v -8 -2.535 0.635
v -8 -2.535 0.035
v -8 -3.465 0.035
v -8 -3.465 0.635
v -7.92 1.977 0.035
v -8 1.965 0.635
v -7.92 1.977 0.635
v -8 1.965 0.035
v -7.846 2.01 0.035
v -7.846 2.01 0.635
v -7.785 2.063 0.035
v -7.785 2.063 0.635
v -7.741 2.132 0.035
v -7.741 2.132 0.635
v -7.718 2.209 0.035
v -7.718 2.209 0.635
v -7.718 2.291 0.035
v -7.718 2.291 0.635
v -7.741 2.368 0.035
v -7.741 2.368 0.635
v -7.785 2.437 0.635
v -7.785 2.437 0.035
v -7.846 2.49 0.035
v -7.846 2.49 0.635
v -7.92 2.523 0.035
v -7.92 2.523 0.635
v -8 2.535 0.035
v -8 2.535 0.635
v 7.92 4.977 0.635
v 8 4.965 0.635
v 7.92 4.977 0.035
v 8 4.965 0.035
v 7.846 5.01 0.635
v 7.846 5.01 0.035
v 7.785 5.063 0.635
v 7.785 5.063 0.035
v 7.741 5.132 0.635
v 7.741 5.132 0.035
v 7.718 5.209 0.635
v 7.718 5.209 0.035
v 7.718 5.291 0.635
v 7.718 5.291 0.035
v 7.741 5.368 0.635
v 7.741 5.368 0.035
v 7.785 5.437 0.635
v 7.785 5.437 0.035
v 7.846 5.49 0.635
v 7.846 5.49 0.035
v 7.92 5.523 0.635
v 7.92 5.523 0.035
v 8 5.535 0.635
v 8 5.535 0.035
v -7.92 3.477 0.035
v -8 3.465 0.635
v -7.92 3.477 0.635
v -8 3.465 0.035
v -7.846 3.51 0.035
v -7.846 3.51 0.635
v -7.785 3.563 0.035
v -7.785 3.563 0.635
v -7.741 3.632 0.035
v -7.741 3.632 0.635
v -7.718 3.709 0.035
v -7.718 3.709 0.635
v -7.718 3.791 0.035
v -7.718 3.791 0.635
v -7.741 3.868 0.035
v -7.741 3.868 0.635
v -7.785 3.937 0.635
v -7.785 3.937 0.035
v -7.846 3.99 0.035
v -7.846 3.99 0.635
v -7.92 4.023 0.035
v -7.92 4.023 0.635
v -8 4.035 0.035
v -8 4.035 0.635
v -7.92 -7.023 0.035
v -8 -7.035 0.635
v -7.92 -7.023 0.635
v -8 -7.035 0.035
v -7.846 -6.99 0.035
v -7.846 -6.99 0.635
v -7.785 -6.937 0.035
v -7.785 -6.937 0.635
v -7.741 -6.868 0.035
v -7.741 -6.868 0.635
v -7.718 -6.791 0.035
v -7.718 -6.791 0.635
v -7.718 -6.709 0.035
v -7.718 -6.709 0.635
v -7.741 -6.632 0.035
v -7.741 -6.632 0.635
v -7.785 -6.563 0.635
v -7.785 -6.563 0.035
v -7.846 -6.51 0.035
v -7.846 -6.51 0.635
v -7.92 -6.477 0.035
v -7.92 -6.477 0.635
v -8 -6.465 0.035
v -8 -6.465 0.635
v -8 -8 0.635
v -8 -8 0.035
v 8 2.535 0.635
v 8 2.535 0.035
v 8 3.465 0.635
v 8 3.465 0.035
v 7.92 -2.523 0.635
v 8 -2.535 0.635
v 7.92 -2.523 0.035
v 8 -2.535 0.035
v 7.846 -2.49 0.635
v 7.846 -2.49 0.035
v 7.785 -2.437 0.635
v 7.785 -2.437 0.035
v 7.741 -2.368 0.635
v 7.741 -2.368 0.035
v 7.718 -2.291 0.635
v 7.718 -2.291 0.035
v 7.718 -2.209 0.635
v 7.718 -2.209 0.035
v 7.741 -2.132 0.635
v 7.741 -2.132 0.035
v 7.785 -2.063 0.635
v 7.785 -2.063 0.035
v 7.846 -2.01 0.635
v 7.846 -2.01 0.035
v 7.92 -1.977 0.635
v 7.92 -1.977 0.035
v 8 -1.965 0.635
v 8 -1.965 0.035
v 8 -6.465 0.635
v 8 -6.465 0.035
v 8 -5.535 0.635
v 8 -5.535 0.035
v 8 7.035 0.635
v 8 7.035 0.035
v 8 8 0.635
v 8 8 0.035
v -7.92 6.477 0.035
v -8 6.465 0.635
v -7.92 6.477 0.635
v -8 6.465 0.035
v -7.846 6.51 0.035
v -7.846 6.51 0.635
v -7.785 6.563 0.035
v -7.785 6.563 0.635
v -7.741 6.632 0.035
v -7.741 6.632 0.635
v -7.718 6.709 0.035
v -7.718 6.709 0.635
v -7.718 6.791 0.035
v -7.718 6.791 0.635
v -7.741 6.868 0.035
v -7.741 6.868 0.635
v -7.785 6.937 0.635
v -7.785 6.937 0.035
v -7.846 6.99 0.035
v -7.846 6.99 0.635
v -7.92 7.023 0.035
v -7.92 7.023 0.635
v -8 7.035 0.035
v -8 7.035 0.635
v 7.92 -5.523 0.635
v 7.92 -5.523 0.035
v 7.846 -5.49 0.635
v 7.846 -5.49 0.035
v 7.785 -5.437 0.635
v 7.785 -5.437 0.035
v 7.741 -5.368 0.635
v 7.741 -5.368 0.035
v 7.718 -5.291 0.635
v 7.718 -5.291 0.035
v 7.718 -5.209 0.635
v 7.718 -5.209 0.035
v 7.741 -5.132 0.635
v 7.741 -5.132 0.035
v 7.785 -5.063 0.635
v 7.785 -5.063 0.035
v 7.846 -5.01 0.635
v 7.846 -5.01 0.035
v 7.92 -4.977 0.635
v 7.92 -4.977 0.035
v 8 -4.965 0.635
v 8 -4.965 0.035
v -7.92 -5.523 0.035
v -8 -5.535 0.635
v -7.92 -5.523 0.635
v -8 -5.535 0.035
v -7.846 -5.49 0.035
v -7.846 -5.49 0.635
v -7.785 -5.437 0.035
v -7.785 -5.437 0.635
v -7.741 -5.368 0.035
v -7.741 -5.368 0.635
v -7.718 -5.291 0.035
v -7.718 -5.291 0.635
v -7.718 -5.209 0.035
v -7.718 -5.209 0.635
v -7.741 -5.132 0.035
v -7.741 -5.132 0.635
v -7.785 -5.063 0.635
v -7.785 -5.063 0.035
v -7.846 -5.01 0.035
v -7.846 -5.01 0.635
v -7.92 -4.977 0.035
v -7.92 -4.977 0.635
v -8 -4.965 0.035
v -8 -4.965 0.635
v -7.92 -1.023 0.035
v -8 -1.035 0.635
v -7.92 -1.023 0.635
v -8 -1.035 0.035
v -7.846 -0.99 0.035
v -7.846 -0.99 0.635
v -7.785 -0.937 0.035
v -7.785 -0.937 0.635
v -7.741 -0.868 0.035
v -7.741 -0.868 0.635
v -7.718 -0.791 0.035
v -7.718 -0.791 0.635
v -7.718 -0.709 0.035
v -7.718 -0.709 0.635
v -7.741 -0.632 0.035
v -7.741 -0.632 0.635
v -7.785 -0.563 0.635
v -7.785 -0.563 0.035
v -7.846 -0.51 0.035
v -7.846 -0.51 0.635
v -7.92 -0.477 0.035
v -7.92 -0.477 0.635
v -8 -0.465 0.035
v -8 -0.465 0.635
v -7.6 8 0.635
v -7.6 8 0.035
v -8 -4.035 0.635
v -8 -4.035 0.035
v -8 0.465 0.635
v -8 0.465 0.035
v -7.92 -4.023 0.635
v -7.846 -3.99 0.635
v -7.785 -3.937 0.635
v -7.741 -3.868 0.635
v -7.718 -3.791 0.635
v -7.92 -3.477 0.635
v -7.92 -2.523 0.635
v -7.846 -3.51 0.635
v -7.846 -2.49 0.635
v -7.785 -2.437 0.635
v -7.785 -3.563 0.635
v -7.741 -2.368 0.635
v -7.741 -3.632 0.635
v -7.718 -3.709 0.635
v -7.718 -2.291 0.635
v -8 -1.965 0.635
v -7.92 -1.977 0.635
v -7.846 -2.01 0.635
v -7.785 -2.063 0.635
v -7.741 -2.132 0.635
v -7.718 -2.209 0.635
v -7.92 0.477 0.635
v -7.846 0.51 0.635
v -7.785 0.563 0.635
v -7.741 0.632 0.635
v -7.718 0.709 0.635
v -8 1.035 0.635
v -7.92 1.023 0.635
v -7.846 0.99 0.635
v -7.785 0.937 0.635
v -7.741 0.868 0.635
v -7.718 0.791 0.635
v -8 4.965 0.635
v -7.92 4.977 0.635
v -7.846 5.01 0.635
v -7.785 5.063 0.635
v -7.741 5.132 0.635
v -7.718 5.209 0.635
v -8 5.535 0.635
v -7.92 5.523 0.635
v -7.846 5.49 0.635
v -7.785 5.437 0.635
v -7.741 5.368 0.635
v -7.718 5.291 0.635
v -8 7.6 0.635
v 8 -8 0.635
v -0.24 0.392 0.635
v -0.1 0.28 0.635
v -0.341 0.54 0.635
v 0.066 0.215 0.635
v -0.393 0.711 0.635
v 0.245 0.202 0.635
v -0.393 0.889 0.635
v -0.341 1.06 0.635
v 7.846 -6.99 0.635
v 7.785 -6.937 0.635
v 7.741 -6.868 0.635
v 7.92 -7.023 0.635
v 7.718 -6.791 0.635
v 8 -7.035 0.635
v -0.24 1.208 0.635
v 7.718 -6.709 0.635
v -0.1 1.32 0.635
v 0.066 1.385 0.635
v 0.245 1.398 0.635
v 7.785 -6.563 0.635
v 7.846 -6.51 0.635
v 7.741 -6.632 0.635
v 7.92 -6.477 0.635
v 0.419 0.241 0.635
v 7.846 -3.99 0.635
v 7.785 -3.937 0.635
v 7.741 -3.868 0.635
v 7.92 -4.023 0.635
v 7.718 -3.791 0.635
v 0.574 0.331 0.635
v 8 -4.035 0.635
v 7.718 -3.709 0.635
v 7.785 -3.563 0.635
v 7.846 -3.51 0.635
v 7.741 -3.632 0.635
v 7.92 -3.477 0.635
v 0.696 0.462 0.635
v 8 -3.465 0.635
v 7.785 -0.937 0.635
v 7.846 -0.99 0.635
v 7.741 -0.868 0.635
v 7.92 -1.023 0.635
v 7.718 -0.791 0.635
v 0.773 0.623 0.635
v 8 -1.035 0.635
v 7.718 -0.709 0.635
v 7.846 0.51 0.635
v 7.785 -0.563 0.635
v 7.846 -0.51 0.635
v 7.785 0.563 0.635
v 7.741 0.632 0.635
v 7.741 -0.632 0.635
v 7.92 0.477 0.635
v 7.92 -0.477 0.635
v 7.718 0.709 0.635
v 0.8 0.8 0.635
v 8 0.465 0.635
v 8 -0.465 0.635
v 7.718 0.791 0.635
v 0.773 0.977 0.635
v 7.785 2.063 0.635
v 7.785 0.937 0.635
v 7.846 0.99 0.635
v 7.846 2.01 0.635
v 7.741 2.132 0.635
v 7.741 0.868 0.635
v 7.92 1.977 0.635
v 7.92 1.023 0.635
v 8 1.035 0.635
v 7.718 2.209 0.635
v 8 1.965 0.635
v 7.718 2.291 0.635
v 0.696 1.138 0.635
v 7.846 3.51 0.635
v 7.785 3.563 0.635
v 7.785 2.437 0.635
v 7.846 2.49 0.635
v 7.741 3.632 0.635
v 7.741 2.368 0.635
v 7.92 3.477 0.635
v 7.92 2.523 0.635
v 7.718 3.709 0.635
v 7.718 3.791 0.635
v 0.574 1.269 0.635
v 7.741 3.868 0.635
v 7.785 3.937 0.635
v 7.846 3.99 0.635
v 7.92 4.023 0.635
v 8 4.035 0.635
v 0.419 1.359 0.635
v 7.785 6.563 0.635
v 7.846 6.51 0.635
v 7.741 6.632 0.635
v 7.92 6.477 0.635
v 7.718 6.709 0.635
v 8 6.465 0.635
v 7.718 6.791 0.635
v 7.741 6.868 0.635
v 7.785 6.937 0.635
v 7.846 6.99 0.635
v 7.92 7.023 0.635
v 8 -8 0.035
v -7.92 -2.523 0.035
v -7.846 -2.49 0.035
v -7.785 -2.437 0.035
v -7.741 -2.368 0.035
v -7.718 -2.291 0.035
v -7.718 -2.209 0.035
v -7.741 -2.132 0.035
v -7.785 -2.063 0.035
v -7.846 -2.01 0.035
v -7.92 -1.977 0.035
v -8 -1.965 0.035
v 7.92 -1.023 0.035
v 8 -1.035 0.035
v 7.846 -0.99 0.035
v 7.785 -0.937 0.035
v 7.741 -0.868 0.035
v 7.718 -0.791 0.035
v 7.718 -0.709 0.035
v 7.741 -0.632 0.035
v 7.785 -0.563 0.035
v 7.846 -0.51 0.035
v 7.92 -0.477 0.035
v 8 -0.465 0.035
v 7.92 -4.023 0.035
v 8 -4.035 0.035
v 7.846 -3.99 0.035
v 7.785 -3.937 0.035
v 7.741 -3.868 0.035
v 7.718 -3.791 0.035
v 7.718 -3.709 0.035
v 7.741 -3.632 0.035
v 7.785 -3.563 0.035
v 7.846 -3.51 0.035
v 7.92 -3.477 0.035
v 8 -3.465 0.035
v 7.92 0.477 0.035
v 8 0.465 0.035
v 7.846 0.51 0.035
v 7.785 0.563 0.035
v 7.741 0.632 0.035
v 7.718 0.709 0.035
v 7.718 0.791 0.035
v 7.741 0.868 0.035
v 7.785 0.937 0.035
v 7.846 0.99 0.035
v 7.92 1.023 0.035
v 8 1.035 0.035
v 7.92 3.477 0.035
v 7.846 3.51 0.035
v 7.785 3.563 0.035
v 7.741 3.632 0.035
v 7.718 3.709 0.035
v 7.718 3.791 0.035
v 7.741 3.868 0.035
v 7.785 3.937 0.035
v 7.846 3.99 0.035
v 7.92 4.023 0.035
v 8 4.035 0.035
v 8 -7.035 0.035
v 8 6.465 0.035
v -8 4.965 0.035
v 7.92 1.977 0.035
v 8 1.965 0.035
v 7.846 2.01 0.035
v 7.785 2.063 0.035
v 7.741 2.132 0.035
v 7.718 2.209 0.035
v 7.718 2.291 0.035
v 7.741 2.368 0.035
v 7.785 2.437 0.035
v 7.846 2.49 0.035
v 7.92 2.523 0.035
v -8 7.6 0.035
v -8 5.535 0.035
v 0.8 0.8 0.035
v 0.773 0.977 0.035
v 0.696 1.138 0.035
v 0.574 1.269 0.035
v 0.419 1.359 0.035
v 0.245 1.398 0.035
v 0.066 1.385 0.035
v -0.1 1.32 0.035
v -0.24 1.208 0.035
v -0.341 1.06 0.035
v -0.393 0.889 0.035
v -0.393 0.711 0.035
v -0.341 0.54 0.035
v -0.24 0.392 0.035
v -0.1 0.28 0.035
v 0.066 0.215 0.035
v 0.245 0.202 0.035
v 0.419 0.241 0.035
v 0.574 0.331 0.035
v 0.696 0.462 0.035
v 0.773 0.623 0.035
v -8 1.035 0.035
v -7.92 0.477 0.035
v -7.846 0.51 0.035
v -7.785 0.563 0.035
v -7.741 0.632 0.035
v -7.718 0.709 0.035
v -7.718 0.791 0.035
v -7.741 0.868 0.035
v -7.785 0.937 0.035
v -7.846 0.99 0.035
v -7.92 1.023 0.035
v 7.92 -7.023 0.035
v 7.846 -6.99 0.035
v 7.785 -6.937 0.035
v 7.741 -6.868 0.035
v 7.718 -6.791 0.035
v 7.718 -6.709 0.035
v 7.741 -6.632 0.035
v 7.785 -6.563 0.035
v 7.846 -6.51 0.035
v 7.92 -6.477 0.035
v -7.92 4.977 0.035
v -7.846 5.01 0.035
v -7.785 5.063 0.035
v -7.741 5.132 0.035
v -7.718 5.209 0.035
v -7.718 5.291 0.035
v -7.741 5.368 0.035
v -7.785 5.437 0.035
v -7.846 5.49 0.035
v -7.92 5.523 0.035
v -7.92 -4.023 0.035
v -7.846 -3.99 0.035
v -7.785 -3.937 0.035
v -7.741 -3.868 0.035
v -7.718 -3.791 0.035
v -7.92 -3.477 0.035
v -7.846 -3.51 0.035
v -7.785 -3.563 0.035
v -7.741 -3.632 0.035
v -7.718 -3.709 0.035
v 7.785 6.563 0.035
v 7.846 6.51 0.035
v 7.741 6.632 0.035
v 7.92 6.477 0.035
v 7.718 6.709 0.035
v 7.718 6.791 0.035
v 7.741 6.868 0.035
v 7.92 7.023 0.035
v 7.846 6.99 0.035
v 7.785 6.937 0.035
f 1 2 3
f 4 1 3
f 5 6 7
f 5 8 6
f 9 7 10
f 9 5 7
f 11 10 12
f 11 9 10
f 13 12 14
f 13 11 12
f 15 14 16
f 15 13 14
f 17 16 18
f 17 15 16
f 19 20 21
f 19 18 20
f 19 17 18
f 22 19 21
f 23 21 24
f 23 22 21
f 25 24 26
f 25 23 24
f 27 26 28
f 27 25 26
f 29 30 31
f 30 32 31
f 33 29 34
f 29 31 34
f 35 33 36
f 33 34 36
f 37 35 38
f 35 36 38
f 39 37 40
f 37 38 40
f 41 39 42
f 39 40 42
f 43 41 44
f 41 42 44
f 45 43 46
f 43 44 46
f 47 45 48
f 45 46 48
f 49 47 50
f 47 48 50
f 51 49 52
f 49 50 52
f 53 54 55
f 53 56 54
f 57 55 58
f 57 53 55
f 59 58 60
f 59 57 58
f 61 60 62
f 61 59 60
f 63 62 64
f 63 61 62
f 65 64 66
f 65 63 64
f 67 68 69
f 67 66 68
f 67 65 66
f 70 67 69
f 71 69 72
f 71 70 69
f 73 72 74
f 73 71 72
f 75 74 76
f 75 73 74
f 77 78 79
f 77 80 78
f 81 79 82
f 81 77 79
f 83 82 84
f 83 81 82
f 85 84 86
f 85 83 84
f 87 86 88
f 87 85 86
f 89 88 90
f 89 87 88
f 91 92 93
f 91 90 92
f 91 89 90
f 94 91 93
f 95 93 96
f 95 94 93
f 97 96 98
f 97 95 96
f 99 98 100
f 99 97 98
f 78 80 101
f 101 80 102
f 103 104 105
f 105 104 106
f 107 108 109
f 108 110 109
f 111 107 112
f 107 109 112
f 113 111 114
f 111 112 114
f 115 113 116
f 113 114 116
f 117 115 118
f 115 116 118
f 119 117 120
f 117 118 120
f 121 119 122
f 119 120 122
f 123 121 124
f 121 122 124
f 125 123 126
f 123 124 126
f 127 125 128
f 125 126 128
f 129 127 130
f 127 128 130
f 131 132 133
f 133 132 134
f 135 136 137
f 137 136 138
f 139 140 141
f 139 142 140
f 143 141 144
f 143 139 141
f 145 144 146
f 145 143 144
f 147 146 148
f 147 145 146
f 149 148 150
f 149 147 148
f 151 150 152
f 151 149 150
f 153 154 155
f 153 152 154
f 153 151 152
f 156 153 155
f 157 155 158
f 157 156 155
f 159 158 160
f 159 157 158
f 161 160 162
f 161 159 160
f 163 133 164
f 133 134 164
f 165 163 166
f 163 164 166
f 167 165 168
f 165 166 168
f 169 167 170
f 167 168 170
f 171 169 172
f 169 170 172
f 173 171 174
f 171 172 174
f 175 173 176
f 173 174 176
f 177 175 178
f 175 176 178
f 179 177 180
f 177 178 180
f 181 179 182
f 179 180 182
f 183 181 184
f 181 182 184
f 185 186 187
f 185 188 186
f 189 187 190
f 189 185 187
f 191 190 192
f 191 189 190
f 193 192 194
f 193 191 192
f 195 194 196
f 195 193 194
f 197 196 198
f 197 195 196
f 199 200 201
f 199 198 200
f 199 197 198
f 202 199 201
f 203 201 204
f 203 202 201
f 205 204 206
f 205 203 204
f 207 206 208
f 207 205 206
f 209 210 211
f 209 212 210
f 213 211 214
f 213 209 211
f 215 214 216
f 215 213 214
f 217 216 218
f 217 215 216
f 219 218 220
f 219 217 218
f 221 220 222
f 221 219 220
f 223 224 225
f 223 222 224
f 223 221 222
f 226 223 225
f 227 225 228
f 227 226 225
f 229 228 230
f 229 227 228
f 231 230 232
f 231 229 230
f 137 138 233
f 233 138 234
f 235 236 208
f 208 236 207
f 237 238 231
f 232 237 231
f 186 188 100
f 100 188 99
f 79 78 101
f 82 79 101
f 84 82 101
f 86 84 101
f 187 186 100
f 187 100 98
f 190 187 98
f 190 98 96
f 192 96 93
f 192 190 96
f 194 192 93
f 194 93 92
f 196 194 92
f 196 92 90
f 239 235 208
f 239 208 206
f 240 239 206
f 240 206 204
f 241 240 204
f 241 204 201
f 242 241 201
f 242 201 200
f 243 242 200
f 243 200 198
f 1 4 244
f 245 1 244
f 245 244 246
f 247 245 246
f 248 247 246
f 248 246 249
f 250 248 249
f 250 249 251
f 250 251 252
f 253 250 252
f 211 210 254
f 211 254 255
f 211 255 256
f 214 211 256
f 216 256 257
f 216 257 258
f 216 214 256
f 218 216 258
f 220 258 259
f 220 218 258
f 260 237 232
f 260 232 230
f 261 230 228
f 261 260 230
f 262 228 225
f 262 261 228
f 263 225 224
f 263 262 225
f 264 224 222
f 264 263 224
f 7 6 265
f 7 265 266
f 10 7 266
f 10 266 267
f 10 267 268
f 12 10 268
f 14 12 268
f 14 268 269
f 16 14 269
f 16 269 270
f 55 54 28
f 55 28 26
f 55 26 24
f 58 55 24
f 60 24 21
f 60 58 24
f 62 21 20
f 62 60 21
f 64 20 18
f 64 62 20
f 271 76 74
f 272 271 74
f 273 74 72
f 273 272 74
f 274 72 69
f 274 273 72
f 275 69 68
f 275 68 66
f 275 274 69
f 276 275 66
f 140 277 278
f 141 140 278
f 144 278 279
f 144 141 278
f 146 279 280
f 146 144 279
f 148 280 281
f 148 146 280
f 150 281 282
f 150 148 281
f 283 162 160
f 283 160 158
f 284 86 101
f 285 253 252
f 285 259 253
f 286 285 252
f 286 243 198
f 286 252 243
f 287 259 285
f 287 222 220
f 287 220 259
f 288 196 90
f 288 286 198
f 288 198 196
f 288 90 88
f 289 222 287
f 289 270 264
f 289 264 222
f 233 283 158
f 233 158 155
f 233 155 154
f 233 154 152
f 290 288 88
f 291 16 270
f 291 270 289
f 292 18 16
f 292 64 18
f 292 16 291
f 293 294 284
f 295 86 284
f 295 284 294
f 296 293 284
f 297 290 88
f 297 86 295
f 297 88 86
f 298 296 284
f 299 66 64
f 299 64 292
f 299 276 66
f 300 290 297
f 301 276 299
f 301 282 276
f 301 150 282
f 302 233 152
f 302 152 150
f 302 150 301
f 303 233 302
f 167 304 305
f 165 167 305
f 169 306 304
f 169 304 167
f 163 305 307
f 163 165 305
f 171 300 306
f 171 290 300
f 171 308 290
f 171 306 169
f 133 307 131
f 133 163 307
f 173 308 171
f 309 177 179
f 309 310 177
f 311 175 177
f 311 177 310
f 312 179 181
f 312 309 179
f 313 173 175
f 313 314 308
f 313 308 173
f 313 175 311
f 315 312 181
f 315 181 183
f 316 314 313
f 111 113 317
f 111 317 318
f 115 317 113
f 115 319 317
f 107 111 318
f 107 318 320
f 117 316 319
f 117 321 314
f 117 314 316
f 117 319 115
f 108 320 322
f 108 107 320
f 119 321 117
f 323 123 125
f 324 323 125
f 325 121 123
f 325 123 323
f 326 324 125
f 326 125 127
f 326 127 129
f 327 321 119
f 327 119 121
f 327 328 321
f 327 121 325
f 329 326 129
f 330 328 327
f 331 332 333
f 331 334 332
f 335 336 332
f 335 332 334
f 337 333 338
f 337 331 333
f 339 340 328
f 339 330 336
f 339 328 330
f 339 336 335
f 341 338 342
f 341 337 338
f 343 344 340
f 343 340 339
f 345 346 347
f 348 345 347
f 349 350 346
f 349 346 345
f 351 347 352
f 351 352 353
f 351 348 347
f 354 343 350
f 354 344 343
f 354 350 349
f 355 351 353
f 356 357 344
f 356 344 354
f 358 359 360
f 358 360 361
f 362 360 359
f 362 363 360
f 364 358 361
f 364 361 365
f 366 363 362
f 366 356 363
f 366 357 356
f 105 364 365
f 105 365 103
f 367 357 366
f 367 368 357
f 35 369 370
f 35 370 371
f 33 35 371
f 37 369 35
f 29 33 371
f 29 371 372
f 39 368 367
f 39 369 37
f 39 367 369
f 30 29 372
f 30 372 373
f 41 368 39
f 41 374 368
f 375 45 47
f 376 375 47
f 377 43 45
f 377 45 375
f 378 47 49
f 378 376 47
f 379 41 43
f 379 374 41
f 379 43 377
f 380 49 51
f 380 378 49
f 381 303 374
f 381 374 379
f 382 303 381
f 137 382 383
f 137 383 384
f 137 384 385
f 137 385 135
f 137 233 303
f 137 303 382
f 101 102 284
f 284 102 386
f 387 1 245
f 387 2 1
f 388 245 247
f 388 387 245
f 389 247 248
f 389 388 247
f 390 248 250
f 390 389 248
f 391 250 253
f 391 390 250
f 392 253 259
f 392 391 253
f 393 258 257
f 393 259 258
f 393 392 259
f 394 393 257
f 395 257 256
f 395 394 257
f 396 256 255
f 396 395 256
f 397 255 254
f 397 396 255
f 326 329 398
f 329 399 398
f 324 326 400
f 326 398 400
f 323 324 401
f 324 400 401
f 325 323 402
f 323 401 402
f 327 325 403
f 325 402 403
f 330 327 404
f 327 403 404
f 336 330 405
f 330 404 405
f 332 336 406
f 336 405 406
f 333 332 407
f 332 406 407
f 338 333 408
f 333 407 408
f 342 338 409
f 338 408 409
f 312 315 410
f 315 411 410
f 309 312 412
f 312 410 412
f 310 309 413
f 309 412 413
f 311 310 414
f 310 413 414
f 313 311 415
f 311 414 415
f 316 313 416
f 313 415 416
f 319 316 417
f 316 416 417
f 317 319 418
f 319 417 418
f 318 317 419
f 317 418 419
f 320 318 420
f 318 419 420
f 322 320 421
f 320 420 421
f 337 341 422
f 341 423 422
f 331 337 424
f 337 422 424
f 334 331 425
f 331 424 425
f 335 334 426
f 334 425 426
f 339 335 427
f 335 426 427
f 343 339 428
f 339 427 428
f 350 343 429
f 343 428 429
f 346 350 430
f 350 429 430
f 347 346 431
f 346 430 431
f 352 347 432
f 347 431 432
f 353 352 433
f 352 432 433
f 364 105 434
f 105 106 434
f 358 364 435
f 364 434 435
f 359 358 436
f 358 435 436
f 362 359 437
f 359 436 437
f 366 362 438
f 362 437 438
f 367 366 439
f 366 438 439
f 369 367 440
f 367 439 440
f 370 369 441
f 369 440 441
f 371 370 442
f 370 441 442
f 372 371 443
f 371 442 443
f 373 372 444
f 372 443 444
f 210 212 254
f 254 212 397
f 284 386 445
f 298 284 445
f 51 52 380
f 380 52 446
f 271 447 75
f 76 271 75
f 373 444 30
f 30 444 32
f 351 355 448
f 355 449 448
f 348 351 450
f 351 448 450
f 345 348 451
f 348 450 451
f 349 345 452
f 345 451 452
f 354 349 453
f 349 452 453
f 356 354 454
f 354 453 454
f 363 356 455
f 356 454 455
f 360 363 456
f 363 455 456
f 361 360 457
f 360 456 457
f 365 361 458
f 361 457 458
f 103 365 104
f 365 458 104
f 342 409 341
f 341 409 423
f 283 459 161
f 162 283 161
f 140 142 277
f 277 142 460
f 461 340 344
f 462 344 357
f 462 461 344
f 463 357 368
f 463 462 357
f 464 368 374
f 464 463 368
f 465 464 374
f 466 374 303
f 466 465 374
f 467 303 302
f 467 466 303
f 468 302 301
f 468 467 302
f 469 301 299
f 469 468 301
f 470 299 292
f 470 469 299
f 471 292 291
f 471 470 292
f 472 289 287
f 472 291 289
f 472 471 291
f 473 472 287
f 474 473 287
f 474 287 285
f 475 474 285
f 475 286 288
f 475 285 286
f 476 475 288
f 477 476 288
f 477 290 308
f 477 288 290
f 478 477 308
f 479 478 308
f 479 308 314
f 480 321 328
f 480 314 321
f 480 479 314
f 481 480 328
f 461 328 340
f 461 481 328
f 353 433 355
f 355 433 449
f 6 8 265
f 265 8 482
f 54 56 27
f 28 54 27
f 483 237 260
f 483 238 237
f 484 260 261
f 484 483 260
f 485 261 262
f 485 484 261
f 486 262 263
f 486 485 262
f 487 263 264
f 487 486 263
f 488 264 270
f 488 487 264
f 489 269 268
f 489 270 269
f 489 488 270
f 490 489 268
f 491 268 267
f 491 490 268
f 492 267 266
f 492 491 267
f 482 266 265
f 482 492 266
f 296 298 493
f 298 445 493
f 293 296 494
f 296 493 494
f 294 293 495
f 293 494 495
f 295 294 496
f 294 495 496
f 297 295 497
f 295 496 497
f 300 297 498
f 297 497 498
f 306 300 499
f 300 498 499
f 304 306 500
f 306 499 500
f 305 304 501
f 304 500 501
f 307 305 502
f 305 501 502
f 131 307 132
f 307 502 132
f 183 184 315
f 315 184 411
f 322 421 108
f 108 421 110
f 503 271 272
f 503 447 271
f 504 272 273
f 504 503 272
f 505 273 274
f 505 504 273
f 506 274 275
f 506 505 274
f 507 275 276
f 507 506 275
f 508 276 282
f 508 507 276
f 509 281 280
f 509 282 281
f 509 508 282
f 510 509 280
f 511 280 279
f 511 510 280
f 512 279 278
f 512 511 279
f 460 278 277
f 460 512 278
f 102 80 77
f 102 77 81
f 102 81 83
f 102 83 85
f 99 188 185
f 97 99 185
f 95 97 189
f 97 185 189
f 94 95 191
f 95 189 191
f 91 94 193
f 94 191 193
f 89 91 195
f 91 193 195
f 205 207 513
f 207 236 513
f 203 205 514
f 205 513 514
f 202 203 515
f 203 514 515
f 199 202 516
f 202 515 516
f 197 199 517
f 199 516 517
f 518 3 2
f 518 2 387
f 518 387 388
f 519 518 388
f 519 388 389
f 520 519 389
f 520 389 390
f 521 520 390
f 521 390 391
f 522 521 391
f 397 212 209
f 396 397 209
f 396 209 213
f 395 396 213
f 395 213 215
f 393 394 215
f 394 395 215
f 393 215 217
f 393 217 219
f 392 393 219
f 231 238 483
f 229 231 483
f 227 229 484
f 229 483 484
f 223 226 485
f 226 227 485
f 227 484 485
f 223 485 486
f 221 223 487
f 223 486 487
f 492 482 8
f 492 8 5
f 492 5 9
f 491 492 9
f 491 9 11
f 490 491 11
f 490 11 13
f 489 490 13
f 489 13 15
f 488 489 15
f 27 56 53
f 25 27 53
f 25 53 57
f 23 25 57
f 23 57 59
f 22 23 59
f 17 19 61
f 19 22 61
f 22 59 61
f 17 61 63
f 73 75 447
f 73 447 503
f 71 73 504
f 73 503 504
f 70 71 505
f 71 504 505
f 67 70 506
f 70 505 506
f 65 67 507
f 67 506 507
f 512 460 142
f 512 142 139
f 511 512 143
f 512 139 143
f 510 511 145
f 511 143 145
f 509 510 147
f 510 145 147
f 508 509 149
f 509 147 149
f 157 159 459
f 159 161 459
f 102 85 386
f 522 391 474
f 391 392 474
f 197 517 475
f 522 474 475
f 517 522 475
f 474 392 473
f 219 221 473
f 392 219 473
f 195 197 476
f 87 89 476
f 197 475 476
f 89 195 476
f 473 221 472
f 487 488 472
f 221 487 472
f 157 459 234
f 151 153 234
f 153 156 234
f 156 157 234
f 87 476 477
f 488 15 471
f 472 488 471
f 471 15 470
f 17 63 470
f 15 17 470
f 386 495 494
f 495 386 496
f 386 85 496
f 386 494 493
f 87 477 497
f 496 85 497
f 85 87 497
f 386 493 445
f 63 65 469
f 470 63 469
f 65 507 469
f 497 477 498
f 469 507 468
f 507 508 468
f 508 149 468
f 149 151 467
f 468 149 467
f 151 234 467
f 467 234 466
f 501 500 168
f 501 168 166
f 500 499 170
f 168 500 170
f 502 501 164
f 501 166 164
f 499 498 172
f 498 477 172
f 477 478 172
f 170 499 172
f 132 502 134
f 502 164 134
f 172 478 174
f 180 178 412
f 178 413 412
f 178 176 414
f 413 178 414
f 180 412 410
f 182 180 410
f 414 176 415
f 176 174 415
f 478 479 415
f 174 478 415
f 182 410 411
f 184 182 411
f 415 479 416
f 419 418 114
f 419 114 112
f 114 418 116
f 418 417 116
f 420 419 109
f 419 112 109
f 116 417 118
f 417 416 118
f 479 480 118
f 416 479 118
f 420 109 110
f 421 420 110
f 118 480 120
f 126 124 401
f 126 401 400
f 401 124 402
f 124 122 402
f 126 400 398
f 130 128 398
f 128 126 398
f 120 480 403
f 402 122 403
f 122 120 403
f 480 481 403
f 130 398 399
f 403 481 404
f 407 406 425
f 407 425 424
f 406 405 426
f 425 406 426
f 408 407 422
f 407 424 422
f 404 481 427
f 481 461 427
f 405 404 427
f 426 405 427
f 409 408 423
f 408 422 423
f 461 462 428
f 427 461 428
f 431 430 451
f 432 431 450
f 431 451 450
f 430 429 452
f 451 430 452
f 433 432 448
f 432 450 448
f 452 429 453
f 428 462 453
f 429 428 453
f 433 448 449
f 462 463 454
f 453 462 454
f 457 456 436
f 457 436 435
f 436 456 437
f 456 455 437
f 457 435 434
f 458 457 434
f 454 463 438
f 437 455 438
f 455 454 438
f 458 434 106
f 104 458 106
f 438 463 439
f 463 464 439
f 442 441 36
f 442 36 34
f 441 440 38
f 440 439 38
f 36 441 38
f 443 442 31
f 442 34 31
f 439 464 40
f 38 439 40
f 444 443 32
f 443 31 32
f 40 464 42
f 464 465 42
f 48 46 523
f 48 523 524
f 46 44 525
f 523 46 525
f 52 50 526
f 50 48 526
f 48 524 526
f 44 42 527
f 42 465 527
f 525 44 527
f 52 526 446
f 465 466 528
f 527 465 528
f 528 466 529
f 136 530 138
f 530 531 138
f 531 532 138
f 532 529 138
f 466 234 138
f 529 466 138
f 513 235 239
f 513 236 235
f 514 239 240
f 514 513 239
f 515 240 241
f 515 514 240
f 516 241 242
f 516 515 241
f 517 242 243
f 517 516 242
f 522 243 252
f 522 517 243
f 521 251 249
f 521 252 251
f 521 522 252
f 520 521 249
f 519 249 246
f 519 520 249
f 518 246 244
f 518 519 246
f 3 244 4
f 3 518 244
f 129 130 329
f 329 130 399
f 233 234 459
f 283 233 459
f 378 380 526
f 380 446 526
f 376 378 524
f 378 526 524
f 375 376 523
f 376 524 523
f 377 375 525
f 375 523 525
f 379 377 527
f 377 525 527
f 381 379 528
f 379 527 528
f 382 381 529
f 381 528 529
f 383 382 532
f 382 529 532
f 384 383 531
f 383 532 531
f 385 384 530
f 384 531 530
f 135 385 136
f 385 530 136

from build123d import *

# Parameters (mm, degrees)
PAD_DEPTH                        = 0.6
SKETCH001_R                      = 0.6
POCKET_DEPTH                     = 0.601
SKETCH002_R                      = 0.2848
POCKET001_DEPTH                  = 45.871741
SKETCH002_LINEARPATTERN_2_R      = 0.2848
POCKET001_LINEARPATTERN_2_DEPTH  = 45.871741
SKETCH002_LINEARPATTERN_3_R      = 0.2848
POCKET001_LINEARPATTERN_3_DEPTH  = 45.871741
SKETCH002_LINEARPATTERN_4_R      = 0.2848
POCKET001_LINEARPATTERN_4_DEPTH  = 45.871741
SKETCH002_LINEARPATTERN_5_R      = 0.2848
POCKET001_LINEARPATTERN_5_DEPTH  = 45.871741
SKETCH002_LINEARPATTERN_6_R      = 0.2848
POCKET001_LINEARPATTERN_6_DEPTH  = 45.871741
SKETCH002_LINEARPATTERN_7_R      = 0.2848
POCKET001_LINEARPATTERN_7_DEPTH  = 45.871741
SKETCH002_LINEARPATTERN_8_R      = 0.2848
POCKET001_LINEARPATTERN_8_DEPTH  = 45.871741
SKETCH002_LINEARPATTERN_9_R      = 0.2848
POCKET001_LINEARPATTERN_9_DEPTH  = 45.871741
SKETCH002_LINEARPATTERN_10_R     = 0.2848
POCKET001_LINEARPATTERN_10_DEPTH = 45.871741


with BuildPart() as part:
    # Sketch → Pad (new body)
    with BuildSketch(Plane.XY):
        Polygon((-8, -8), (8, -8), (8, 8), (-7.6, 8), (-8, 7.6), align=None)
    extrude(amount=PAD_DEPTH)

    # Sketch001 → Pocket (cut, through all)
    with BuildSketch(Plane.XY):
        with Locations((0.2, 0.8)):
            Circle(SKETCH001_R)
    extrude(amount=POCKET_DEPTH, mode=Mode.SUBTRACT)

    # Sketch002 → Pocket001 (cut, through all)
    with BuildSketch(Plane.XY):
        with Locations((-8, 6.75)):
            Circle(SKETCH002_R)
    pocket001 = extrude(amount=POCKET001_DEPTH, mode=Mode.SUBTRACT)

    # Sketch002 LinearPattern 2 → Pocket001 LinearPattern 2 (cut, through all)
    with BuildSketch(Plane(origin=(0, -1.5, 0), x_dir=(1, 0, 0), z_dir=(0, 0, 1))):
        with Locations((-8, 6.75)):
            Circle(SKETCH002_LINEARPATTERN_2_R)
    pocket001_linearpattern_2 = extrude(amount=POCKET001_LINEARPATTERN_2_DEPTH, mode=Mode.SUBTRACT)

    # Sketch002 LinearPattern 3 → Pocket001 LinearPattern 3 (cut, through all)
    with BuildSketch(Plane(origin=(0, -3, 0), x_dir=(1, 0, 0), z_dir=(0, 0, 1))):
        with Locations((-8, 6.75)):
            Circle(SKETCH002_LINEARPATTERN_3_R)
    pocket001_linearpattern_3 = extrude(amount=POCKET001_LINEARPATTERN_3_DEPTH, mode=Mode.SUBTRACT)

    # Sketch002 LinearPattern 4 → Pocket001 LinearPattern 4 (cut, through all)
    with BuildSketch(Plane(origin=(0, -4.5, 0), x_dir=(1, 0, 0), z_dir=(0, 0, 1))):
        with Locations((-8, 6.75)):
            Circle(SKETCH002_LINEARPATTERN_4_R)
    pocket001_linearpattern_4 = extrude(amount=POCKET001_LINEARPATTERN_4_DEPTH, mode=Mode.SUBTRACT)

    # Sketch002 LinearPattern 5 → Pocket001 LinearPattern 5 (cut, through all)
    with BuildSketch(Plane(origin=(0, -6, 0), x_dir=(1, 0, 0), z_dir=(0, 0, 1))):
        with Locations((-8, 6.75)):
            Circle(SKETCH002_LINEARPATTERN_5_R)
    pocket001_linearpattern_5 = extrude(amount=POCKET001_LINEARPATTERN_5_DEPTH, mode=Mode.SUBTRACT)

    # Sketch002 LinearPattern 6 → Pocket001 LinearPattern 6 (cut, through all)
    with BuildSketch(Plane(origin=(0, -7.5, 0), x_dir=(1, 0, 0), z_dir=(0, 0, 1))):
        with Locations((-8, 6.75)):
            Circle(SKETCH002_LINEARPATTERN_6_R)
    pocket001_linearpattern_6 = extrude(amount=POCKET001_LINEARPATTERN_6_DEPTH, mode=Mode.SUBTRACT)

    # Sketch002 LinearPattern 7 → Pocket001 LinearPattern 7 (cut, through all)
    with BuildSketch(Plane(origin=(0, -9, 0), x_dir=(1, 0, 0), z_dir=(0, 0, 1))):
        with Locations((-8, 6.75)):
            Circle(SKETCH002_LINEARPATTERN_7_R)
    pocket001_linearpattern_7 = extrude(amount=POCKET001_LINEARPATTERN_7_DEPTH, mode=Mode.SUBTRACT)

    # Sketch002 LinearPattern 8 → Pocket001 LinearPattern 8 (cut, through all)
    with BuildSketch(Plane(origin=(0, -10.5, 0), x_dir=(1, 0, 0), z_dir=(0, 0, 1))):
        with Locations((-8, 6.75)):
            Circle(SKETCH002_LINEARPATTERN_8_R)
    pocket001_linearpattern_8 = extrude(amount=POCKET001_LINEARPATTERN_8_DEPTH, mode=Mode.SUBTRACT)

    # Sketch002 LinearPattern 9 → Pocket001 LinearPattern 9 (cut, through all)
    with BuildSketch(Plane(origin=(0, -12, 0), x_dir=(1, 0, 0), z_dir=(0, 0, 1))):
        with Locations((-8, 6.75)):
            Circle(SKETCH002_LINEARPATTERN_9_R)
    pocket001_linearpattern_9 = extrude(amount=POCKET001_LINEARPATTERN_9_DEPTH, mode=Mode.SUBTRACT)

    # Sketch002 LinearPattern 10 → Pocket001 LinearPattern 10 (cut, through all)
    with BuildSketch(Plane(origin=(0, -13.5, 0), x_dir=(1, 0, 0), z_dir=(0, 0, 1))):
        with Locations((-8, 6.75)):
            Circle(SKETCH002_LINEARPATTERN_10_R)
    pocket001_linearpattern_10 = extrude(amount=POCKET001_LINEARPATTERN_10_DEPTH, mode=Mode.SUBTRACT)

    # Mirrored: Pocket001, Pocket001 LinearPattern 2, Pocket001 LinearPattern 3, Pocket001 LinearPattern 4, Pocket001 LinearPattern 5, Pocket001 LinearPattern 6, Pocket001 LinearPattern 7, Pocket001 LinearPattern 8, Pocket001 LinearPattern 9, Pocket001 LinearPattern 10 across Sketch002 V_Axis
    add(pocket001.mirror(Plane(origin=(0, 0, 0), x_dir=(0, 0, 1), z_dir=(1, 0, 0))), mode=Mode.SUBTRACT)
    add(pocket001_linearpattern_2.mirror(Plane(origin=(0, 0, 0), x_dir=(0, 0, 1), z_dir=(1, 0, 0))), mode=Mode.SUBTRACT)
    add(pocket001_linearpattern_3.mirror(Plane(origin=(0, 0, 0), x_dir=(0, 0, 1), z_dir=(1, 0, 0))), mode=Mode.SUBTRACT)
    add(pocket001_linearpattern_4.mirror(Plane(origin=(0, 0, 0), x_dir=(0, 0, 1), z_dir=(1, 0, 0))), mode=Mode.SUBTRACT)
    add(pocket001_linearpattern_5.mirror(Plane(origin=(0, 0, 0), x_dir=(0, 0, 1), z_dir=(1, 0, 0))), mode=Mode.SUBTRACT)
    add(pocket001_linearpattern_6.mirror(Plane(origin=(0, 0, 0), x_dir=(0, 0, 1), z_dir=(1, 0, 0))), mode=Mode.SUBTRACT)
    add(pocket001_linearpattern_7.mirror(Plane(origin=(0, 0, 0), x_dir=(0, 0, 1), z_dir=(1, 0, 0))), mode=Mode.SUBTRACT)
    add(pocket001_linearpattern_8.mirror(Plane(origin=(0, 0, 0), x_dir=(0, 0, 1), z_dir=(1, 0, 0))), mode=Mode.SUBTRACT)
    add(pocket001_linearpattern_9.mirror(Plane(origin=(0, 0, 0), x_dir=(0, 0, 1), z_dir=(1, 0, 0))), mode=Mode.SUBTRACT)
    add(pocket001_linearpattern_10.mirror(Plane(origin=(0, 0, 0), x_dir=(0, 0, 1), z_dir=(1, 0, 0))), mode=Mode.SUBTRACT)


with BuildPart() as part_1:
    # Body placement: moved
    add(part.part.moved(Location((0, 0, 0.0348))))


solid = part_1.part
